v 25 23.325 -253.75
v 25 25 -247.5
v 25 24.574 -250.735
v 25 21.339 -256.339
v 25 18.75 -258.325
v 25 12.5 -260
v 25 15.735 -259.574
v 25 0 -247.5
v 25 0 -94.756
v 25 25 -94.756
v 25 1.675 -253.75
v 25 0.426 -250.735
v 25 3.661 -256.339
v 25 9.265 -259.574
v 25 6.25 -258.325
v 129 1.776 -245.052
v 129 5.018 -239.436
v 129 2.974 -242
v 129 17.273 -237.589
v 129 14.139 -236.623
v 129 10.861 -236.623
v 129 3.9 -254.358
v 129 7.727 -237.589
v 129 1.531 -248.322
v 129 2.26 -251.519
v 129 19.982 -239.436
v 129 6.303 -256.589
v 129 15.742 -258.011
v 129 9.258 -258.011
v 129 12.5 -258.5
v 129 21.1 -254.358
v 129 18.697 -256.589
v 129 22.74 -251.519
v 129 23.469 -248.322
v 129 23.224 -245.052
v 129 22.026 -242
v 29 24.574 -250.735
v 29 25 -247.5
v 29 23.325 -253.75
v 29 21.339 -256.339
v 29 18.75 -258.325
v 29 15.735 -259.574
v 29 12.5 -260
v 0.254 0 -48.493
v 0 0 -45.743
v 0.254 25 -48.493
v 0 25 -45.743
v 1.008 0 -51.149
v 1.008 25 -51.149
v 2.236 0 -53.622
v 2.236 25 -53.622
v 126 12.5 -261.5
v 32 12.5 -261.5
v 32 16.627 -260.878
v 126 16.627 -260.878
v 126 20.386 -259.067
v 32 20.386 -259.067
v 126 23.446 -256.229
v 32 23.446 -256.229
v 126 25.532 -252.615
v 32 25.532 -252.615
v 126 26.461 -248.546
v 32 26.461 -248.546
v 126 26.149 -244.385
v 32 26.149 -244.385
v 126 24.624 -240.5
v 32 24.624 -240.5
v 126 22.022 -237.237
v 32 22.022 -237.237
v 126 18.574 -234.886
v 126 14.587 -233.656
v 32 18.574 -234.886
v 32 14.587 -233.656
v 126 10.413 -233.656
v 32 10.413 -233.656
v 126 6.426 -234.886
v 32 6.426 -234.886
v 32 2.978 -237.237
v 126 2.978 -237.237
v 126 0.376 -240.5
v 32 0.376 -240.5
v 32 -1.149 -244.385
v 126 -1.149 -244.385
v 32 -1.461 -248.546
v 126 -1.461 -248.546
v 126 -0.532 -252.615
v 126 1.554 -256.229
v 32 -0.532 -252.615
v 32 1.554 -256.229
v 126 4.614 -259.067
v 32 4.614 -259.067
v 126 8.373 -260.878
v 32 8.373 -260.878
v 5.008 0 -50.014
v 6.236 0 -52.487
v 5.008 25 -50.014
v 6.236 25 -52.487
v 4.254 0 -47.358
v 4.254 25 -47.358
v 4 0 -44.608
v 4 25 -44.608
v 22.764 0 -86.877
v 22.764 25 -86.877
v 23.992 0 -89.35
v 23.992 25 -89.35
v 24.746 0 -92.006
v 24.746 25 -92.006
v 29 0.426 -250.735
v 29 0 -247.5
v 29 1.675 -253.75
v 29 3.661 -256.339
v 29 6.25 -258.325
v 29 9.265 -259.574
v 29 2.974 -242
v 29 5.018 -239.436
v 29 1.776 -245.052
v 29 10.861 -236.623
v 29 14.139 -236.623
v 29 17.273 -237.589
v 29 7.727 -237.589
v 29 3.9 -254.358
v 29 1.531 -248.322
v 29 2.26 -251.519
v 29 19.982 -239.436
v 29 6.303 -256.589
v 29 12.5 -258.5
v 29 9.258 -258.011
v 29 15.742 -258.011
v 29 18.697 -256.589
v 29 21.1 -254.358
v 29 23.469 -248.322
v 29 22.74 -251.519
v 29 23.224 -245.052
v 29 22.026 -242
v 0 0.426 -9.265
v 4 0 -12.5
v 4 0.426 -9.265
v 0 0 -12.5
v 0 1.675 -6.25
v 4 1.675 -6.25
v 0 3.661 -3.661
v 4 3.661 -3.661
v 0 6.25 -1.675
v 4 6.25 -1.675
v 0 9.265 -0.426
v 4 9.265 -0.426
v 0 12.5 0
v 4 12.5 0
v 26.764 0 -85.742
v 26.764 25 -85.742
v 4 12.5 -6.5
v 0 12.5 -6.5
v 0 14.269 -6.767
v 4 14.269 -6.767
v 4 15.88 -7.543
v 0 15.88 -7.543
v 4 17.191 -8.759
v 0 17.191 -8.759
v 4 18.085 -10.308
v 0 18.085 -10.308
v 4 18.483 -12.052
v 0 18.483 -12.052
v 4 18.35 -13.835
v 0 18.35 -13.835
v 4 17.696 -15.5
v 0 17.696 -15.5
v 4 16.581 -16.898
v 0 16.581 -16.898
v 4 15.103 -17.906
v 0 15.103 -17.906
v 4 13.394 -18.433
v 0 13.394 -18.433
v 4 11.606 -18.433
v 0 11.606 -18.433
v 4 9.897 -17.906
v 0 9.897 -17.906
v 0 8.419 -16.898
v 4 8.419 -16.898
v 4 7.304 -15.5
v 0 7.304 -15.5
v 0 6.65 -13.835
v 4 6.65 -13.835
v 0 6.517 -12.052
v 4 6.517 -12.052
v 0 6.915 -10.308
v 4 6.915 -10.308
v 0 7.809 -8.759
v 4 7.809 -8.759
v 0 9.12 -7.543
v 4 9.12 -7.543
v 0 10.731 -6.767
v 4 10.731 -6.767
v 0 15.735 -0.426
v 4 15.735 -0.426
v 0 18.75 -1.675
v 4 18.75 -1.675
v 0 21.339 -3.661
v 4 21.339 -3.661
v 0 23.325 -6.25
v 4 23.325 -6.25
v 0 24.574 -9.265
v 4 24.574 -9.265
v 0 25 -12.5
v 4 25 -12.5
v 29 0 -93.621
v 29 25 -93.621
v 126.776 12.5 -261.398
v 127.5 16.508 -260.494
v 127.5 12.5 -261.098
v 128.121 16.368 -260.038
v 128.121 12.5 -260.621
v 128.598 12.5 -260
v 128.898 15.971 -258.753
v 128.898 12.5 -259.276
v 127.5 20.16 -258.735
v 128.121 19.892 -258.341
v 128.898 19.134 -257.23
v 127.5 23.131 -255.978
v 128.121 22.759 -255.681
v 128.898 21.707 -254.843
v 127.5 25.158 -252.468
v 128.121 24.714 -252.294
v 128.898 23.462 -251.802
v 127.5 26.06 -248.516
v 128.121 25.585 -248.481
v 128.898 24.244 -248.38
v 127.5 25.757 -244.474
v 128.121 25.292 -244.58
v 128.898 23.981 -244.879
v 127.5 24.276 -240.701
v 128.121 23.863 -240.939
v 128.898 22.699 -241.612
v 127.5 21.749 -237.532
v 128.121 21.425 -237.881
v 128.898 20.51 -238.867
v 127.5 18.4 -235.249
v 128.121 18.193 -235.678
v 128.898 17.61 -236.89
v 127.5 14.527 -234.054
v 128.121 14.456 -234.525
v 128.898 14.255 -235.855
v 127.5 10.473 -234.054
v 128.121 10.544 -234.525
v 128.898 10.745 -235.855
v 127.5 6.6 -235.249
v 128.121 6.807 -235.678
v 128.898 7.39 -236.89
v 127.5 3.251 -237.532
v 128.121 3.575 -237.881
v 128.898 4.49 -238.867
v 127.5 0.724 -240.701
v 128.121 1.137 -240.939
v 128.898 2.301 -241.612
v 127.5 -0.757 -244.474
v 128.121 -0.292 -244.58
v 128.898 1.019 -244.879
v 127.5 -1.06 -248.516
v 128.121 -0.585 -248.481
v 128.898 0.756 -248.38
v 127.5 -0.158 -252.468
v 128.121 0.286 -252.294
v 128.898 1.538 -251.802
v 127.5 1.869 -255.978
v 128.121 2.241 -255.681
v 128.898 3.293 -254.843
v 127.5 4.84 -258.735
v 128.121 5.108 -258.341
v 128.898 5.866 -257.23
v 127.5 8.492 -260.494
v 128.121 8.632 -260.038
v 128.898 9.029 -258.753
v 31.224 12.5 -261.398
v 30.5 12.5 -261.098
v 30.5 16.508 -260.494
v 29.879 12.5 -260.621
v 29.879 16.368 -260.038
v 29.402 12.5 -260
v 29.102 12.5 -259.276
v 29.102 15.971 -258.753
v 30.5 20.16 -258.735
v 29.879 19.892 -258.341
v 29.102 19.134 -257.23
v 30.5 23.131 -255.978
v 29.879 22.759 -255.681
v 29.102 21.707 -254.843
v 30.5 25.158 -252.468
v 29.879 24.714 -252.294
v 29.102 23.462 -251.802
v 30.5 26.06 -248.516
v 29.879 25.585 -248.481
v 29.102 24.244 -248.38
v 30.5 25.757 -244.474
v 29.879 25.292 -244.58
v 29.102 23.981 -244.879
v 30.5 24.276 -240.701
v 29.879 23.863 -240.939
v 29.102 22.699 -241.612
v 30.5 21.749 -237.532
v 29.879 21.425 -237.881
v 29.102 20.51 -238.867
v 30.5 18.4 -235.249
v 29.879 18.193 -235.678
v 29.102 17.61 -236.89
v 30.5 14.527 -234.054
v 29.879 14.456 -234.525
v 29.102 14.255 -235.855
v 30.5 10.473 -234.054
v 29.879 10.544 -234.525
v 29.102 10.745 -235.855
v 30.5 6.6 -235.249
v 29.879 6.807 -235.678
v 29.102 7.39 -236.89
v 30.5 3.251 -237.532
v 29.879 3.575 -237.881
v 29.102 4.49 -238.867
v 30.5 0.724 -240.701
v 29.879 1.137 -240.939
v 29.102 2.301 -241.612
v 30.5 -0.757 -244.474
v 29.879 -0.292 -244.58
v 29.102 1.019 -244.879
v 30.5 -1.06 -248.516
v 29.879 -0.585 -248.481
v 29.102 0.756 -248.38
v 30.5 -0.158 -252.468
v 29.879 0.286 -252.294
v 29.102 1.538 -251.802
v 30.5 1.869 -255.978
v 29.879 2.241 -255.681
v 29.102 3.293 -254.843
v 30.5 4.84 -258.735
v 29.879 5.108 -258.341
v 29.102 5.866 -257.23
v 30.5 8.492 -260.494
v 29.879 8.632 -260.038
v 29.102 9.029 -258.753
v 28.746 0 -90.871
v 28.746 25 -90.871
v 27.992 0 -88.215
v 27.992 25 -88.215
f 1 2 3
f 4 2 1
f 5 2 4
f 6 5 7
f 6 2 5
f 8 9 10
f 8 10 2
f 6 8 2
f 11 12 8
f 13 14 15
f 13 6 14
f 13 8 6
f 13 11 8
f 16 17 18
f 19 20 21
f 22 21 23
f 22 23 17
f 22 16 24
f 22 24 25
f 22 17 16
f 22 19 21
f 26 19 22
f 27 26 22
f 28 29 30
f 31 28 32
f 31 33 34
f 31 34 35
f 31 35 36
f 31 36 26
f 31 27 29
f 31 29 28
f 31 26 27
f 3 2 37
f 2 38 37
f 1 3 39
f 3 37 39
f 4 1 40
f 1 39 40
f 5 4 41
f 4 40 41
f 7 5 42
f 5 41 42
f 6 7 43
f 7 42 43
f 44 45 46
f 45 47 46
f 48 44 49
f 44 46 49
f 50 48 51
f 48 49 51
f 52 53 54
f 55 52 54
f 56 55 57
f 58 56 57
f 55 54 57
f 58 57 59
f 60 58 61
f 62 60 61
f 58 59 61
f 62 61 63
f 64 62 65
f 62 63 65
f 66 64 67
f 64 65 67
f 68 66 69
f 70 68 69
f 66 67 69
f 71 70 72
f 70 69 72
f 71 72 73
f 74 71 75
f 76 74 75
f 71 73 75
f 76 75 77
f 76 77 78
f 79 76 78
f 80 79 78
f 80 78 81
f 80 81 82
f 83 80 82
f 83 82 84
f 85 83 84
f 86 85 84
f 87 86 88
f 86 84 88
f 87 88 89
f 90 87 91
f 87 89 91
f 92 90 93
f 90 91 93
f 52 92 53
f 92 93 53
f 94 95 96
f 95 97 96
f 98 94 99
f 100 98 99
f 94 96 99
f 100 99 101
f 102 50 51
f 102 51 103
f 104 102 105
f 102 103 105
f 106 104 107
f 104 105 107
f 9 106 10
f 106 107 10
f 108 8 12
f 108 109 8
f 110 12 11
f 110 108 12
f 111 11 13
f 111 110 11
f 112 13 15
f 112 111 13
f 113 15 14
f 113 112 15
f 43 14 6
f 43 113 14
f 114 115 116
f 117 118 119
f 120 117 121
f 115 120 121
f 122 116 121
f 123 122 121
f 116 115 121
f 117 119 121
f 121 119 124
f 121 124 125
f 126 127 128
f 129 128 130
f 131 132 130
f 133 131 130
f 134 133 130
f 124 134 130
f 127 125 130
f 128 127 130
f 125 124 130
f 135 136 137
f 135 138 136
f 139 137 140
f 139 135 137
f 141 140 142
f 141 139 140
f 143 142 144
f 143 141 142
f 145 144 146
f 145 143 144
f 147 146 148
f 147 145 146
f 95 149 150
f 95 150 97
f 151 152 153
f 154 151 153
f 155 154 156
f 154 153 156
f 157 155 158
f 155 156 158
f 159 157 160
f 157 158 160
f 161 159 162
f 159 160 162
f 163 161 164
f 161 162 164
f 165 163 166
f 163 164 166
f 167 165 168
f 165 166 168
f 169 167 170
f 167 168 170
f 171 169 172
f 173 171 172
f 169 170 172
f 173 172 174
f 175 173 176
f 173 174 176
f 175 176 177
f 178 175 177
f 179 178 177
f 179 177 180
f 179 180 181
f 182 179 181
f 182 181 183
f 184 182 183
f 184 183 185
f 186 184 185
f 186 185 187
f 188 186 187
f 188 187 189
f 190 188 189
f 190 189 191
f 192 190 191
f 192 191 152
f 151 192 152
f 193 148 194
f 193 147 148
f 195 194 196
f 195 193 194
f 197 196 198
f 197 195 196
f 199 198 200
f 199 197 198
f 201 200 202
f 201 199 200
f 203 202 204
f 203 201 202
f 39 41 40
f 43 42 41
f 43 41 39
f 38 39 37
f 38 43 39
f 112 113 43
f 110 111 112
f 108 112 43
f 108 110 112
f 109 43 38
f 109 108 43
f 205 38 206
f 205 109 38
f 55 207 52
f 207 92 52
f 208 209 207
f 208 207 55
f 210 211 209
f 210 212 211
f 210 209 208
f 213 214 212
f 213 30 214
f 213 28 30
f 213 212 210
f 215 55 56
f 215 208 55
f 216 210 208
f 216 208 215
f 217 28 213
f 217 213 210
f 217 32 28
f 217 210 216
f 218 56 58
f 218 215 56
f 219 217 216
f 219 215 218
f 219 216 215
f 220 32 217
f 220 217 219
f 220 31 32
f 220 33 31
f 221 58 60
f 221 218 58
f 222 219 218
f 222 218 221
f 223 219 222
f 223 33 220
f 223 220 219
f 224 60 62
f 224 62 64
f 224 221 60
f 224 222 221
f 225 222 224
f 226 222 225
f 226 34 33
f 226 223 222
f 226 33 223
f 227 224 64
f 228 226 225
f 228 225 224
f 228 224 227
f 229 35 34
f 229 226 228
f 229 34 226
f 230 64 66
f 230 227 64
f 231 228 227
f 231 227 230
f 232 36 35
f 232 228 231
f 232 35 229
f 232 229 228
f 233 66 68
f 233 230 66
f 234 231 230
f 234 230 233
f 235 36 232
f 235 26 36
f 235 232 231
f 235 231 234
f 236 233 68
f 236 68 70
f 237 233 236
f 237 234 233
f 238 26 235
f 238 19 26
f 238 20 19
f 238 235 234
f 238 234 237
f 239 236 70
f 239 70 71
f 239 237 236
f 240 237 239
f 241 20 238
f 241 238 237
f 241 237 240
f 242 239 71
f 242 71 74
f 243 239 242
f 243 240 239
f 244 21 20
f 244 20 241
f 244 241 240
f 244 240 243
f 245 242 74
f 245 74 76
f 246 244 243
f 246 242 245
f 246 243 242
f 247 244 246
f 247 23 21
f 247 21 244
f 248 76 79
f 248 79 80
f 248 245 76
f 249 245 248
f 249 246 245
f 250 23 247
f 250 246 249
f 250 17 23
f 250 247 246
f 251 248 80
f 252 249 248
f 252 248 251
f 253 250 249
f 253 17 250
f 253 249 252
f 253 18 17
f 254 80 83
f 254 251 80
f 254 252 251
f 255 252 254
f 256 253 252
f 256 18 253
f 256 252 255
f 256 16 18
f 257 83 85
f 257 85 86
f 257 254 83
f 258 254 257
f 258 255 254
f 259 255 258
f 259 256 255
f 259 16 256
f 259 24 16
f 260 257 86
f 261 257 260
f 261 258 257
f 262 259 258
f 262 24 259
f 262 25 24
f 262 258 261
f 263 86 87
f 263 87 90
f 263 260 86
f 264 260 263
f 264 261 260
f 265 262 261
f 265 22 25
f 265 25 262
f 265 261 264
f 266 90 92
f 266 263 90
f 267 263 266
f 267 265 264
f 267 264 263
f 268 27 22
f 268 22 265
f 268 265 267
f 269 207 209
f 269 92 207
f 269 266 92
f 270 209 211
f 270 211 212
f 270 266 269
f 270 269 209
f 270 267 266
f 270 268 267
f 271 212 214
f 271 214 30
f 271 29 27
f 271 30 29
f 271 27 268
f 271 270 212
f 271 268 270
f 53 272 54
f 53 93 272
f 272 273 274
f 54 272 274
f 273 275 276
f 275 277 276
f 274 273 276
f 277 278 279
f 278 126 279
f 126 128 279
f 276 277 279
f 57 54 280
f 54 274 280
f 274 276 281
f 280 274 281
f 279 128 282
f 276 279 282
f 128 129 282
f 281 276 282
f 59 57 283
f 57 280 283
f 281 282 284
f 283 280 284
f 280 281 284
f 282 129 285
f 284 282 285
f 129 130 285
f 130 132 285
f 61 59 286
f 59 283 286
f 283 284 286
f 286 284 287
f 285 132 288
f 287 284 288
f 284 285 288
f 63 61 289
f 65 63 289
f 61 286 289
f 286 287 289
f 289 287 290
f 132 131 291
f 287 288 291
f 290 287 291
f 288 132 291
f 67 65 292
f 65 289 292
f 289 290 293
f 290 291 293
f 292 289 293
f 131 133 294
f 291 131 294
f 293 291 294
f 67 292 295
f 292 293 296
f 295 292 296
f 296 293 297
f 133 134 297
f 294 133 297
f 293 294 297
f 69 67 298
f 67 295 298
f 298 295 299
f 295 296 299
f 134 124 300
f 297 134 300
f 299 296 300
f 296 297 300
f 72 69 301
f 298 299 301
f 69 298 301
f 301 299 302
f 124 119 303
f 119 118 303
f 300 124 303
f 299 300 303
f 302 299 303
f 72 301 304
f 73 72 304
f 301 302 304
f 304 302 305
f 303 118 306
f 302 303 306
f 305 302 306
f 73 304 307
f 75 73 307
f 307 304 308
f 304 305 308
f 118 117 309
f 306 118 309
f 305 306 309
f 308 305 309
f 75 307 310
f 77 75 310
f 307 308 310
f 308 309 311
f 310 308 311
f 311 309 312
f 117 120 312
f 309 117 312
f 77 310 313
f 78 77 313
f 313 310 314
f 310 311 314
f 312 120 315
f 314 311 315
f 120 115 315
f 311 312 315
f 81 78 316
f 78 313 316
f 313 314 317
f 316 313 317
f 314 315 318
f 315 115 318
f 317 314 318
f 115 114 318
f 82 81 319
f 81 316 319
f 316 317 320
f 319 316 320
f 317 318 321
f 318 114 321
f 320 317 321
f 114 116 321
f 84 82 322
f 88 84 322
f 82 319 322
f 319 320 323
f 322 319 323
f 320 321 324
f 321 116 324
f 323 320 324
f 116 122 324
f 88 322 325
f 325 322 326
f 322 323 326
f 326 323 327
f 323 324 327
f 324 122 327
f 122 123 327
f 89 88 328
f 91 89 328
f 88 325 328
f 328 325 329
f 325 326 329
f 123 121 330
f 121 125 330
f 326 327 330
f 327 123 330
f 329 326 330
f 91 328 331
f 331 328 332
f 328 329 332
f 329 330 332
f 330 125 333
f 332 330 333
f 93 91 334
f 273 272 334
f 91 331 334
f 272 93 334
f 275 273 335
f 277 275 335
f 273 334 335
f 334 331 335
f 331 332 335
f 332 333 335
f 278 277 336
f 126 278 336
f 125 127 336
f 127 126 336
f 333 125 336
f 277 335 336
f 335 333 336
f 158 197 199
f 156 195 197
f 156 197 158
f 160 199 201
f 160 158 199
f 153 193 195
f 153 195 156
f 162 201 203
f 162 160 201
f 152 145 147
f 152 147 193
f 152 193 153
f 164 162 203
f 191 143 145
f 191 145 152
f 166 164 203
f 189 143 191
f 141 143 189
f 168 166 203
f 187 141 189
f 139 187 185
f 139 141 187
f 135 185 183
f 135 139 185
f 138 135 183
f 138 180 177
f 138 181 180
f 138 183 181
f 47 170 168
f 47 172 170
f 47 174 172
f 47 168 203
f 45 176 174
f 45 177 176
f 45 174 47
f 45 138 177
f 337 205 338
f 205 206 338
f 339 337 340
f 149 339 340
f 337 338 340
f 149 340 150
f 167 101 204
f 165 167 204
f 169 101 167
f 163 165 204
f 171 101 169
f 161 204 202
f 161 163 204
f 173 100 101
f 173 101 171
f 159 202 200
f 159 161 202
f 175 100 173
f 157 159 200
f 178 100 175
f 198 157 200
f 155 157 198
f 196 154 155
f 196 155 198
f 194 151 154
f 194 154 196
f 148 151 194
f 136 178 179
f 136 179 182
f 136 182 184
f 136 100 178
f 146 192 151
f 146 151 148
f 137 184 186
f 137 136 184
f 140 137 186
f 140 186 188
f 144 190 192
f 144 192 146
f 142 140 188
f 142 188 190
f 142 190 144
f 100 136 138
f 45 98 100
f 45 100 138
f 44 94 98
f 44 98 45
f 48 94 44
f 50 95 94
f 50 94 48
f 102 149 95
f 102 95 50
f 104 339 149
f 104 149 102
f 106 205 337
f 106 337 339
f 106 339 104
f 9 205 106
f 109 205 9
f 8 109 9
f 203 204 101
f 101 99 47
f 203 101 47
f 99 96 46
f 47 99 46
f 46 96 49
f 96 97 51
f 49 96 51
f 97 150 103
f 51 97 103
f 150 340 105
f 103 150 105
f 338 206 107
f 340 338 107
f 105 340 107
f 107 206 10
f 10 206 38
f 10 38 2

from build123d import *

# Parameters (mm, degrees)
EXTRUDE_THIN1_DEPTH = 25
FILLET1_R           = 15
FILLET2_R           = 12.5
SKETCH2_R           = 6
CUT_EXTRUDE1_DEPTH  = 10
SKETCH3_R           = 14
BOSS_EXTRUDE1_DEPTH = 100
FILLET3_R           = 3


with BuildPart() as part:
    # Sketch1 → Extrude-Thin1 (new body)
    with BuildSketch(Plane(origin=(0, 0, 0), x_dir=(1, 0, 0), z_dir=(0, 1, 0))):
        Polygon((0, 0), (0, 50), (25, 90.499181326), (25, 260), (29, 260), (29, 89.364018992), (4, 48.864837665), (4, 0), align=None)
    extrude(amount=EXTRUDE_THIN1_DEPTH)

    # Fillet1
    fillet1_edges = [part.edges().sort_by_distance(p)[0] for p in [
        (29, 12.5, -89.364018992),
        (4, 12.5, -48.864837665),
        (0, 12.5, -50),
        (25, 12.5, -90.499181326),
    ]]
    fillet(fillet1_edges, radius=FILLET1_R)

    # Fillet2
    fillet2_edges = [part.edges().sort_by_distance(p)[0] for p in [
        (27, 0, -260),
        (27, 25, -260),
        (2, 0, 0),
        (2, 25, 0),
    ]]
    fillet(fillet2_edges, radius=FILLET2_R - 0.0001)  # a hair under: the kernel refuses the full size

    # Sketch2 → Cut-Extrude1 (cut)
    with BuildSketch(Plane.ZY):
        with Locations((-12.5, 12.5)):
            Circle(SKETCH2_R)
    extrude(amount=-CUT_EXTRUDE1_DEPTH, mode=Mode.SUBTRACT)


with BuildPart() as body_2:
    # Sketch3 → Boss-Extrude1 (new body)
    with BuildSketch(Plane(origin=(29, 0, 0), x_dir=(0, 0, -1), z_dir=(1, 0, 0))):
        with Locations((247.5, 12.5)):
            Circle(SKETCH3_R)
    extrude(amount=BOSS_EXTRUDE1_DEPTH)

    # Fillet3
    fillet3_edges = [body_2.edges().sort_by_distance(p)[0] for p in [
        (29, 12.5, -233.5),
        (129, 12.5, -233.5),
    ]]
    fillet(fillet3_edges, radius=FILLET3_R)


solid = Compound([part.part, body_2.part])
